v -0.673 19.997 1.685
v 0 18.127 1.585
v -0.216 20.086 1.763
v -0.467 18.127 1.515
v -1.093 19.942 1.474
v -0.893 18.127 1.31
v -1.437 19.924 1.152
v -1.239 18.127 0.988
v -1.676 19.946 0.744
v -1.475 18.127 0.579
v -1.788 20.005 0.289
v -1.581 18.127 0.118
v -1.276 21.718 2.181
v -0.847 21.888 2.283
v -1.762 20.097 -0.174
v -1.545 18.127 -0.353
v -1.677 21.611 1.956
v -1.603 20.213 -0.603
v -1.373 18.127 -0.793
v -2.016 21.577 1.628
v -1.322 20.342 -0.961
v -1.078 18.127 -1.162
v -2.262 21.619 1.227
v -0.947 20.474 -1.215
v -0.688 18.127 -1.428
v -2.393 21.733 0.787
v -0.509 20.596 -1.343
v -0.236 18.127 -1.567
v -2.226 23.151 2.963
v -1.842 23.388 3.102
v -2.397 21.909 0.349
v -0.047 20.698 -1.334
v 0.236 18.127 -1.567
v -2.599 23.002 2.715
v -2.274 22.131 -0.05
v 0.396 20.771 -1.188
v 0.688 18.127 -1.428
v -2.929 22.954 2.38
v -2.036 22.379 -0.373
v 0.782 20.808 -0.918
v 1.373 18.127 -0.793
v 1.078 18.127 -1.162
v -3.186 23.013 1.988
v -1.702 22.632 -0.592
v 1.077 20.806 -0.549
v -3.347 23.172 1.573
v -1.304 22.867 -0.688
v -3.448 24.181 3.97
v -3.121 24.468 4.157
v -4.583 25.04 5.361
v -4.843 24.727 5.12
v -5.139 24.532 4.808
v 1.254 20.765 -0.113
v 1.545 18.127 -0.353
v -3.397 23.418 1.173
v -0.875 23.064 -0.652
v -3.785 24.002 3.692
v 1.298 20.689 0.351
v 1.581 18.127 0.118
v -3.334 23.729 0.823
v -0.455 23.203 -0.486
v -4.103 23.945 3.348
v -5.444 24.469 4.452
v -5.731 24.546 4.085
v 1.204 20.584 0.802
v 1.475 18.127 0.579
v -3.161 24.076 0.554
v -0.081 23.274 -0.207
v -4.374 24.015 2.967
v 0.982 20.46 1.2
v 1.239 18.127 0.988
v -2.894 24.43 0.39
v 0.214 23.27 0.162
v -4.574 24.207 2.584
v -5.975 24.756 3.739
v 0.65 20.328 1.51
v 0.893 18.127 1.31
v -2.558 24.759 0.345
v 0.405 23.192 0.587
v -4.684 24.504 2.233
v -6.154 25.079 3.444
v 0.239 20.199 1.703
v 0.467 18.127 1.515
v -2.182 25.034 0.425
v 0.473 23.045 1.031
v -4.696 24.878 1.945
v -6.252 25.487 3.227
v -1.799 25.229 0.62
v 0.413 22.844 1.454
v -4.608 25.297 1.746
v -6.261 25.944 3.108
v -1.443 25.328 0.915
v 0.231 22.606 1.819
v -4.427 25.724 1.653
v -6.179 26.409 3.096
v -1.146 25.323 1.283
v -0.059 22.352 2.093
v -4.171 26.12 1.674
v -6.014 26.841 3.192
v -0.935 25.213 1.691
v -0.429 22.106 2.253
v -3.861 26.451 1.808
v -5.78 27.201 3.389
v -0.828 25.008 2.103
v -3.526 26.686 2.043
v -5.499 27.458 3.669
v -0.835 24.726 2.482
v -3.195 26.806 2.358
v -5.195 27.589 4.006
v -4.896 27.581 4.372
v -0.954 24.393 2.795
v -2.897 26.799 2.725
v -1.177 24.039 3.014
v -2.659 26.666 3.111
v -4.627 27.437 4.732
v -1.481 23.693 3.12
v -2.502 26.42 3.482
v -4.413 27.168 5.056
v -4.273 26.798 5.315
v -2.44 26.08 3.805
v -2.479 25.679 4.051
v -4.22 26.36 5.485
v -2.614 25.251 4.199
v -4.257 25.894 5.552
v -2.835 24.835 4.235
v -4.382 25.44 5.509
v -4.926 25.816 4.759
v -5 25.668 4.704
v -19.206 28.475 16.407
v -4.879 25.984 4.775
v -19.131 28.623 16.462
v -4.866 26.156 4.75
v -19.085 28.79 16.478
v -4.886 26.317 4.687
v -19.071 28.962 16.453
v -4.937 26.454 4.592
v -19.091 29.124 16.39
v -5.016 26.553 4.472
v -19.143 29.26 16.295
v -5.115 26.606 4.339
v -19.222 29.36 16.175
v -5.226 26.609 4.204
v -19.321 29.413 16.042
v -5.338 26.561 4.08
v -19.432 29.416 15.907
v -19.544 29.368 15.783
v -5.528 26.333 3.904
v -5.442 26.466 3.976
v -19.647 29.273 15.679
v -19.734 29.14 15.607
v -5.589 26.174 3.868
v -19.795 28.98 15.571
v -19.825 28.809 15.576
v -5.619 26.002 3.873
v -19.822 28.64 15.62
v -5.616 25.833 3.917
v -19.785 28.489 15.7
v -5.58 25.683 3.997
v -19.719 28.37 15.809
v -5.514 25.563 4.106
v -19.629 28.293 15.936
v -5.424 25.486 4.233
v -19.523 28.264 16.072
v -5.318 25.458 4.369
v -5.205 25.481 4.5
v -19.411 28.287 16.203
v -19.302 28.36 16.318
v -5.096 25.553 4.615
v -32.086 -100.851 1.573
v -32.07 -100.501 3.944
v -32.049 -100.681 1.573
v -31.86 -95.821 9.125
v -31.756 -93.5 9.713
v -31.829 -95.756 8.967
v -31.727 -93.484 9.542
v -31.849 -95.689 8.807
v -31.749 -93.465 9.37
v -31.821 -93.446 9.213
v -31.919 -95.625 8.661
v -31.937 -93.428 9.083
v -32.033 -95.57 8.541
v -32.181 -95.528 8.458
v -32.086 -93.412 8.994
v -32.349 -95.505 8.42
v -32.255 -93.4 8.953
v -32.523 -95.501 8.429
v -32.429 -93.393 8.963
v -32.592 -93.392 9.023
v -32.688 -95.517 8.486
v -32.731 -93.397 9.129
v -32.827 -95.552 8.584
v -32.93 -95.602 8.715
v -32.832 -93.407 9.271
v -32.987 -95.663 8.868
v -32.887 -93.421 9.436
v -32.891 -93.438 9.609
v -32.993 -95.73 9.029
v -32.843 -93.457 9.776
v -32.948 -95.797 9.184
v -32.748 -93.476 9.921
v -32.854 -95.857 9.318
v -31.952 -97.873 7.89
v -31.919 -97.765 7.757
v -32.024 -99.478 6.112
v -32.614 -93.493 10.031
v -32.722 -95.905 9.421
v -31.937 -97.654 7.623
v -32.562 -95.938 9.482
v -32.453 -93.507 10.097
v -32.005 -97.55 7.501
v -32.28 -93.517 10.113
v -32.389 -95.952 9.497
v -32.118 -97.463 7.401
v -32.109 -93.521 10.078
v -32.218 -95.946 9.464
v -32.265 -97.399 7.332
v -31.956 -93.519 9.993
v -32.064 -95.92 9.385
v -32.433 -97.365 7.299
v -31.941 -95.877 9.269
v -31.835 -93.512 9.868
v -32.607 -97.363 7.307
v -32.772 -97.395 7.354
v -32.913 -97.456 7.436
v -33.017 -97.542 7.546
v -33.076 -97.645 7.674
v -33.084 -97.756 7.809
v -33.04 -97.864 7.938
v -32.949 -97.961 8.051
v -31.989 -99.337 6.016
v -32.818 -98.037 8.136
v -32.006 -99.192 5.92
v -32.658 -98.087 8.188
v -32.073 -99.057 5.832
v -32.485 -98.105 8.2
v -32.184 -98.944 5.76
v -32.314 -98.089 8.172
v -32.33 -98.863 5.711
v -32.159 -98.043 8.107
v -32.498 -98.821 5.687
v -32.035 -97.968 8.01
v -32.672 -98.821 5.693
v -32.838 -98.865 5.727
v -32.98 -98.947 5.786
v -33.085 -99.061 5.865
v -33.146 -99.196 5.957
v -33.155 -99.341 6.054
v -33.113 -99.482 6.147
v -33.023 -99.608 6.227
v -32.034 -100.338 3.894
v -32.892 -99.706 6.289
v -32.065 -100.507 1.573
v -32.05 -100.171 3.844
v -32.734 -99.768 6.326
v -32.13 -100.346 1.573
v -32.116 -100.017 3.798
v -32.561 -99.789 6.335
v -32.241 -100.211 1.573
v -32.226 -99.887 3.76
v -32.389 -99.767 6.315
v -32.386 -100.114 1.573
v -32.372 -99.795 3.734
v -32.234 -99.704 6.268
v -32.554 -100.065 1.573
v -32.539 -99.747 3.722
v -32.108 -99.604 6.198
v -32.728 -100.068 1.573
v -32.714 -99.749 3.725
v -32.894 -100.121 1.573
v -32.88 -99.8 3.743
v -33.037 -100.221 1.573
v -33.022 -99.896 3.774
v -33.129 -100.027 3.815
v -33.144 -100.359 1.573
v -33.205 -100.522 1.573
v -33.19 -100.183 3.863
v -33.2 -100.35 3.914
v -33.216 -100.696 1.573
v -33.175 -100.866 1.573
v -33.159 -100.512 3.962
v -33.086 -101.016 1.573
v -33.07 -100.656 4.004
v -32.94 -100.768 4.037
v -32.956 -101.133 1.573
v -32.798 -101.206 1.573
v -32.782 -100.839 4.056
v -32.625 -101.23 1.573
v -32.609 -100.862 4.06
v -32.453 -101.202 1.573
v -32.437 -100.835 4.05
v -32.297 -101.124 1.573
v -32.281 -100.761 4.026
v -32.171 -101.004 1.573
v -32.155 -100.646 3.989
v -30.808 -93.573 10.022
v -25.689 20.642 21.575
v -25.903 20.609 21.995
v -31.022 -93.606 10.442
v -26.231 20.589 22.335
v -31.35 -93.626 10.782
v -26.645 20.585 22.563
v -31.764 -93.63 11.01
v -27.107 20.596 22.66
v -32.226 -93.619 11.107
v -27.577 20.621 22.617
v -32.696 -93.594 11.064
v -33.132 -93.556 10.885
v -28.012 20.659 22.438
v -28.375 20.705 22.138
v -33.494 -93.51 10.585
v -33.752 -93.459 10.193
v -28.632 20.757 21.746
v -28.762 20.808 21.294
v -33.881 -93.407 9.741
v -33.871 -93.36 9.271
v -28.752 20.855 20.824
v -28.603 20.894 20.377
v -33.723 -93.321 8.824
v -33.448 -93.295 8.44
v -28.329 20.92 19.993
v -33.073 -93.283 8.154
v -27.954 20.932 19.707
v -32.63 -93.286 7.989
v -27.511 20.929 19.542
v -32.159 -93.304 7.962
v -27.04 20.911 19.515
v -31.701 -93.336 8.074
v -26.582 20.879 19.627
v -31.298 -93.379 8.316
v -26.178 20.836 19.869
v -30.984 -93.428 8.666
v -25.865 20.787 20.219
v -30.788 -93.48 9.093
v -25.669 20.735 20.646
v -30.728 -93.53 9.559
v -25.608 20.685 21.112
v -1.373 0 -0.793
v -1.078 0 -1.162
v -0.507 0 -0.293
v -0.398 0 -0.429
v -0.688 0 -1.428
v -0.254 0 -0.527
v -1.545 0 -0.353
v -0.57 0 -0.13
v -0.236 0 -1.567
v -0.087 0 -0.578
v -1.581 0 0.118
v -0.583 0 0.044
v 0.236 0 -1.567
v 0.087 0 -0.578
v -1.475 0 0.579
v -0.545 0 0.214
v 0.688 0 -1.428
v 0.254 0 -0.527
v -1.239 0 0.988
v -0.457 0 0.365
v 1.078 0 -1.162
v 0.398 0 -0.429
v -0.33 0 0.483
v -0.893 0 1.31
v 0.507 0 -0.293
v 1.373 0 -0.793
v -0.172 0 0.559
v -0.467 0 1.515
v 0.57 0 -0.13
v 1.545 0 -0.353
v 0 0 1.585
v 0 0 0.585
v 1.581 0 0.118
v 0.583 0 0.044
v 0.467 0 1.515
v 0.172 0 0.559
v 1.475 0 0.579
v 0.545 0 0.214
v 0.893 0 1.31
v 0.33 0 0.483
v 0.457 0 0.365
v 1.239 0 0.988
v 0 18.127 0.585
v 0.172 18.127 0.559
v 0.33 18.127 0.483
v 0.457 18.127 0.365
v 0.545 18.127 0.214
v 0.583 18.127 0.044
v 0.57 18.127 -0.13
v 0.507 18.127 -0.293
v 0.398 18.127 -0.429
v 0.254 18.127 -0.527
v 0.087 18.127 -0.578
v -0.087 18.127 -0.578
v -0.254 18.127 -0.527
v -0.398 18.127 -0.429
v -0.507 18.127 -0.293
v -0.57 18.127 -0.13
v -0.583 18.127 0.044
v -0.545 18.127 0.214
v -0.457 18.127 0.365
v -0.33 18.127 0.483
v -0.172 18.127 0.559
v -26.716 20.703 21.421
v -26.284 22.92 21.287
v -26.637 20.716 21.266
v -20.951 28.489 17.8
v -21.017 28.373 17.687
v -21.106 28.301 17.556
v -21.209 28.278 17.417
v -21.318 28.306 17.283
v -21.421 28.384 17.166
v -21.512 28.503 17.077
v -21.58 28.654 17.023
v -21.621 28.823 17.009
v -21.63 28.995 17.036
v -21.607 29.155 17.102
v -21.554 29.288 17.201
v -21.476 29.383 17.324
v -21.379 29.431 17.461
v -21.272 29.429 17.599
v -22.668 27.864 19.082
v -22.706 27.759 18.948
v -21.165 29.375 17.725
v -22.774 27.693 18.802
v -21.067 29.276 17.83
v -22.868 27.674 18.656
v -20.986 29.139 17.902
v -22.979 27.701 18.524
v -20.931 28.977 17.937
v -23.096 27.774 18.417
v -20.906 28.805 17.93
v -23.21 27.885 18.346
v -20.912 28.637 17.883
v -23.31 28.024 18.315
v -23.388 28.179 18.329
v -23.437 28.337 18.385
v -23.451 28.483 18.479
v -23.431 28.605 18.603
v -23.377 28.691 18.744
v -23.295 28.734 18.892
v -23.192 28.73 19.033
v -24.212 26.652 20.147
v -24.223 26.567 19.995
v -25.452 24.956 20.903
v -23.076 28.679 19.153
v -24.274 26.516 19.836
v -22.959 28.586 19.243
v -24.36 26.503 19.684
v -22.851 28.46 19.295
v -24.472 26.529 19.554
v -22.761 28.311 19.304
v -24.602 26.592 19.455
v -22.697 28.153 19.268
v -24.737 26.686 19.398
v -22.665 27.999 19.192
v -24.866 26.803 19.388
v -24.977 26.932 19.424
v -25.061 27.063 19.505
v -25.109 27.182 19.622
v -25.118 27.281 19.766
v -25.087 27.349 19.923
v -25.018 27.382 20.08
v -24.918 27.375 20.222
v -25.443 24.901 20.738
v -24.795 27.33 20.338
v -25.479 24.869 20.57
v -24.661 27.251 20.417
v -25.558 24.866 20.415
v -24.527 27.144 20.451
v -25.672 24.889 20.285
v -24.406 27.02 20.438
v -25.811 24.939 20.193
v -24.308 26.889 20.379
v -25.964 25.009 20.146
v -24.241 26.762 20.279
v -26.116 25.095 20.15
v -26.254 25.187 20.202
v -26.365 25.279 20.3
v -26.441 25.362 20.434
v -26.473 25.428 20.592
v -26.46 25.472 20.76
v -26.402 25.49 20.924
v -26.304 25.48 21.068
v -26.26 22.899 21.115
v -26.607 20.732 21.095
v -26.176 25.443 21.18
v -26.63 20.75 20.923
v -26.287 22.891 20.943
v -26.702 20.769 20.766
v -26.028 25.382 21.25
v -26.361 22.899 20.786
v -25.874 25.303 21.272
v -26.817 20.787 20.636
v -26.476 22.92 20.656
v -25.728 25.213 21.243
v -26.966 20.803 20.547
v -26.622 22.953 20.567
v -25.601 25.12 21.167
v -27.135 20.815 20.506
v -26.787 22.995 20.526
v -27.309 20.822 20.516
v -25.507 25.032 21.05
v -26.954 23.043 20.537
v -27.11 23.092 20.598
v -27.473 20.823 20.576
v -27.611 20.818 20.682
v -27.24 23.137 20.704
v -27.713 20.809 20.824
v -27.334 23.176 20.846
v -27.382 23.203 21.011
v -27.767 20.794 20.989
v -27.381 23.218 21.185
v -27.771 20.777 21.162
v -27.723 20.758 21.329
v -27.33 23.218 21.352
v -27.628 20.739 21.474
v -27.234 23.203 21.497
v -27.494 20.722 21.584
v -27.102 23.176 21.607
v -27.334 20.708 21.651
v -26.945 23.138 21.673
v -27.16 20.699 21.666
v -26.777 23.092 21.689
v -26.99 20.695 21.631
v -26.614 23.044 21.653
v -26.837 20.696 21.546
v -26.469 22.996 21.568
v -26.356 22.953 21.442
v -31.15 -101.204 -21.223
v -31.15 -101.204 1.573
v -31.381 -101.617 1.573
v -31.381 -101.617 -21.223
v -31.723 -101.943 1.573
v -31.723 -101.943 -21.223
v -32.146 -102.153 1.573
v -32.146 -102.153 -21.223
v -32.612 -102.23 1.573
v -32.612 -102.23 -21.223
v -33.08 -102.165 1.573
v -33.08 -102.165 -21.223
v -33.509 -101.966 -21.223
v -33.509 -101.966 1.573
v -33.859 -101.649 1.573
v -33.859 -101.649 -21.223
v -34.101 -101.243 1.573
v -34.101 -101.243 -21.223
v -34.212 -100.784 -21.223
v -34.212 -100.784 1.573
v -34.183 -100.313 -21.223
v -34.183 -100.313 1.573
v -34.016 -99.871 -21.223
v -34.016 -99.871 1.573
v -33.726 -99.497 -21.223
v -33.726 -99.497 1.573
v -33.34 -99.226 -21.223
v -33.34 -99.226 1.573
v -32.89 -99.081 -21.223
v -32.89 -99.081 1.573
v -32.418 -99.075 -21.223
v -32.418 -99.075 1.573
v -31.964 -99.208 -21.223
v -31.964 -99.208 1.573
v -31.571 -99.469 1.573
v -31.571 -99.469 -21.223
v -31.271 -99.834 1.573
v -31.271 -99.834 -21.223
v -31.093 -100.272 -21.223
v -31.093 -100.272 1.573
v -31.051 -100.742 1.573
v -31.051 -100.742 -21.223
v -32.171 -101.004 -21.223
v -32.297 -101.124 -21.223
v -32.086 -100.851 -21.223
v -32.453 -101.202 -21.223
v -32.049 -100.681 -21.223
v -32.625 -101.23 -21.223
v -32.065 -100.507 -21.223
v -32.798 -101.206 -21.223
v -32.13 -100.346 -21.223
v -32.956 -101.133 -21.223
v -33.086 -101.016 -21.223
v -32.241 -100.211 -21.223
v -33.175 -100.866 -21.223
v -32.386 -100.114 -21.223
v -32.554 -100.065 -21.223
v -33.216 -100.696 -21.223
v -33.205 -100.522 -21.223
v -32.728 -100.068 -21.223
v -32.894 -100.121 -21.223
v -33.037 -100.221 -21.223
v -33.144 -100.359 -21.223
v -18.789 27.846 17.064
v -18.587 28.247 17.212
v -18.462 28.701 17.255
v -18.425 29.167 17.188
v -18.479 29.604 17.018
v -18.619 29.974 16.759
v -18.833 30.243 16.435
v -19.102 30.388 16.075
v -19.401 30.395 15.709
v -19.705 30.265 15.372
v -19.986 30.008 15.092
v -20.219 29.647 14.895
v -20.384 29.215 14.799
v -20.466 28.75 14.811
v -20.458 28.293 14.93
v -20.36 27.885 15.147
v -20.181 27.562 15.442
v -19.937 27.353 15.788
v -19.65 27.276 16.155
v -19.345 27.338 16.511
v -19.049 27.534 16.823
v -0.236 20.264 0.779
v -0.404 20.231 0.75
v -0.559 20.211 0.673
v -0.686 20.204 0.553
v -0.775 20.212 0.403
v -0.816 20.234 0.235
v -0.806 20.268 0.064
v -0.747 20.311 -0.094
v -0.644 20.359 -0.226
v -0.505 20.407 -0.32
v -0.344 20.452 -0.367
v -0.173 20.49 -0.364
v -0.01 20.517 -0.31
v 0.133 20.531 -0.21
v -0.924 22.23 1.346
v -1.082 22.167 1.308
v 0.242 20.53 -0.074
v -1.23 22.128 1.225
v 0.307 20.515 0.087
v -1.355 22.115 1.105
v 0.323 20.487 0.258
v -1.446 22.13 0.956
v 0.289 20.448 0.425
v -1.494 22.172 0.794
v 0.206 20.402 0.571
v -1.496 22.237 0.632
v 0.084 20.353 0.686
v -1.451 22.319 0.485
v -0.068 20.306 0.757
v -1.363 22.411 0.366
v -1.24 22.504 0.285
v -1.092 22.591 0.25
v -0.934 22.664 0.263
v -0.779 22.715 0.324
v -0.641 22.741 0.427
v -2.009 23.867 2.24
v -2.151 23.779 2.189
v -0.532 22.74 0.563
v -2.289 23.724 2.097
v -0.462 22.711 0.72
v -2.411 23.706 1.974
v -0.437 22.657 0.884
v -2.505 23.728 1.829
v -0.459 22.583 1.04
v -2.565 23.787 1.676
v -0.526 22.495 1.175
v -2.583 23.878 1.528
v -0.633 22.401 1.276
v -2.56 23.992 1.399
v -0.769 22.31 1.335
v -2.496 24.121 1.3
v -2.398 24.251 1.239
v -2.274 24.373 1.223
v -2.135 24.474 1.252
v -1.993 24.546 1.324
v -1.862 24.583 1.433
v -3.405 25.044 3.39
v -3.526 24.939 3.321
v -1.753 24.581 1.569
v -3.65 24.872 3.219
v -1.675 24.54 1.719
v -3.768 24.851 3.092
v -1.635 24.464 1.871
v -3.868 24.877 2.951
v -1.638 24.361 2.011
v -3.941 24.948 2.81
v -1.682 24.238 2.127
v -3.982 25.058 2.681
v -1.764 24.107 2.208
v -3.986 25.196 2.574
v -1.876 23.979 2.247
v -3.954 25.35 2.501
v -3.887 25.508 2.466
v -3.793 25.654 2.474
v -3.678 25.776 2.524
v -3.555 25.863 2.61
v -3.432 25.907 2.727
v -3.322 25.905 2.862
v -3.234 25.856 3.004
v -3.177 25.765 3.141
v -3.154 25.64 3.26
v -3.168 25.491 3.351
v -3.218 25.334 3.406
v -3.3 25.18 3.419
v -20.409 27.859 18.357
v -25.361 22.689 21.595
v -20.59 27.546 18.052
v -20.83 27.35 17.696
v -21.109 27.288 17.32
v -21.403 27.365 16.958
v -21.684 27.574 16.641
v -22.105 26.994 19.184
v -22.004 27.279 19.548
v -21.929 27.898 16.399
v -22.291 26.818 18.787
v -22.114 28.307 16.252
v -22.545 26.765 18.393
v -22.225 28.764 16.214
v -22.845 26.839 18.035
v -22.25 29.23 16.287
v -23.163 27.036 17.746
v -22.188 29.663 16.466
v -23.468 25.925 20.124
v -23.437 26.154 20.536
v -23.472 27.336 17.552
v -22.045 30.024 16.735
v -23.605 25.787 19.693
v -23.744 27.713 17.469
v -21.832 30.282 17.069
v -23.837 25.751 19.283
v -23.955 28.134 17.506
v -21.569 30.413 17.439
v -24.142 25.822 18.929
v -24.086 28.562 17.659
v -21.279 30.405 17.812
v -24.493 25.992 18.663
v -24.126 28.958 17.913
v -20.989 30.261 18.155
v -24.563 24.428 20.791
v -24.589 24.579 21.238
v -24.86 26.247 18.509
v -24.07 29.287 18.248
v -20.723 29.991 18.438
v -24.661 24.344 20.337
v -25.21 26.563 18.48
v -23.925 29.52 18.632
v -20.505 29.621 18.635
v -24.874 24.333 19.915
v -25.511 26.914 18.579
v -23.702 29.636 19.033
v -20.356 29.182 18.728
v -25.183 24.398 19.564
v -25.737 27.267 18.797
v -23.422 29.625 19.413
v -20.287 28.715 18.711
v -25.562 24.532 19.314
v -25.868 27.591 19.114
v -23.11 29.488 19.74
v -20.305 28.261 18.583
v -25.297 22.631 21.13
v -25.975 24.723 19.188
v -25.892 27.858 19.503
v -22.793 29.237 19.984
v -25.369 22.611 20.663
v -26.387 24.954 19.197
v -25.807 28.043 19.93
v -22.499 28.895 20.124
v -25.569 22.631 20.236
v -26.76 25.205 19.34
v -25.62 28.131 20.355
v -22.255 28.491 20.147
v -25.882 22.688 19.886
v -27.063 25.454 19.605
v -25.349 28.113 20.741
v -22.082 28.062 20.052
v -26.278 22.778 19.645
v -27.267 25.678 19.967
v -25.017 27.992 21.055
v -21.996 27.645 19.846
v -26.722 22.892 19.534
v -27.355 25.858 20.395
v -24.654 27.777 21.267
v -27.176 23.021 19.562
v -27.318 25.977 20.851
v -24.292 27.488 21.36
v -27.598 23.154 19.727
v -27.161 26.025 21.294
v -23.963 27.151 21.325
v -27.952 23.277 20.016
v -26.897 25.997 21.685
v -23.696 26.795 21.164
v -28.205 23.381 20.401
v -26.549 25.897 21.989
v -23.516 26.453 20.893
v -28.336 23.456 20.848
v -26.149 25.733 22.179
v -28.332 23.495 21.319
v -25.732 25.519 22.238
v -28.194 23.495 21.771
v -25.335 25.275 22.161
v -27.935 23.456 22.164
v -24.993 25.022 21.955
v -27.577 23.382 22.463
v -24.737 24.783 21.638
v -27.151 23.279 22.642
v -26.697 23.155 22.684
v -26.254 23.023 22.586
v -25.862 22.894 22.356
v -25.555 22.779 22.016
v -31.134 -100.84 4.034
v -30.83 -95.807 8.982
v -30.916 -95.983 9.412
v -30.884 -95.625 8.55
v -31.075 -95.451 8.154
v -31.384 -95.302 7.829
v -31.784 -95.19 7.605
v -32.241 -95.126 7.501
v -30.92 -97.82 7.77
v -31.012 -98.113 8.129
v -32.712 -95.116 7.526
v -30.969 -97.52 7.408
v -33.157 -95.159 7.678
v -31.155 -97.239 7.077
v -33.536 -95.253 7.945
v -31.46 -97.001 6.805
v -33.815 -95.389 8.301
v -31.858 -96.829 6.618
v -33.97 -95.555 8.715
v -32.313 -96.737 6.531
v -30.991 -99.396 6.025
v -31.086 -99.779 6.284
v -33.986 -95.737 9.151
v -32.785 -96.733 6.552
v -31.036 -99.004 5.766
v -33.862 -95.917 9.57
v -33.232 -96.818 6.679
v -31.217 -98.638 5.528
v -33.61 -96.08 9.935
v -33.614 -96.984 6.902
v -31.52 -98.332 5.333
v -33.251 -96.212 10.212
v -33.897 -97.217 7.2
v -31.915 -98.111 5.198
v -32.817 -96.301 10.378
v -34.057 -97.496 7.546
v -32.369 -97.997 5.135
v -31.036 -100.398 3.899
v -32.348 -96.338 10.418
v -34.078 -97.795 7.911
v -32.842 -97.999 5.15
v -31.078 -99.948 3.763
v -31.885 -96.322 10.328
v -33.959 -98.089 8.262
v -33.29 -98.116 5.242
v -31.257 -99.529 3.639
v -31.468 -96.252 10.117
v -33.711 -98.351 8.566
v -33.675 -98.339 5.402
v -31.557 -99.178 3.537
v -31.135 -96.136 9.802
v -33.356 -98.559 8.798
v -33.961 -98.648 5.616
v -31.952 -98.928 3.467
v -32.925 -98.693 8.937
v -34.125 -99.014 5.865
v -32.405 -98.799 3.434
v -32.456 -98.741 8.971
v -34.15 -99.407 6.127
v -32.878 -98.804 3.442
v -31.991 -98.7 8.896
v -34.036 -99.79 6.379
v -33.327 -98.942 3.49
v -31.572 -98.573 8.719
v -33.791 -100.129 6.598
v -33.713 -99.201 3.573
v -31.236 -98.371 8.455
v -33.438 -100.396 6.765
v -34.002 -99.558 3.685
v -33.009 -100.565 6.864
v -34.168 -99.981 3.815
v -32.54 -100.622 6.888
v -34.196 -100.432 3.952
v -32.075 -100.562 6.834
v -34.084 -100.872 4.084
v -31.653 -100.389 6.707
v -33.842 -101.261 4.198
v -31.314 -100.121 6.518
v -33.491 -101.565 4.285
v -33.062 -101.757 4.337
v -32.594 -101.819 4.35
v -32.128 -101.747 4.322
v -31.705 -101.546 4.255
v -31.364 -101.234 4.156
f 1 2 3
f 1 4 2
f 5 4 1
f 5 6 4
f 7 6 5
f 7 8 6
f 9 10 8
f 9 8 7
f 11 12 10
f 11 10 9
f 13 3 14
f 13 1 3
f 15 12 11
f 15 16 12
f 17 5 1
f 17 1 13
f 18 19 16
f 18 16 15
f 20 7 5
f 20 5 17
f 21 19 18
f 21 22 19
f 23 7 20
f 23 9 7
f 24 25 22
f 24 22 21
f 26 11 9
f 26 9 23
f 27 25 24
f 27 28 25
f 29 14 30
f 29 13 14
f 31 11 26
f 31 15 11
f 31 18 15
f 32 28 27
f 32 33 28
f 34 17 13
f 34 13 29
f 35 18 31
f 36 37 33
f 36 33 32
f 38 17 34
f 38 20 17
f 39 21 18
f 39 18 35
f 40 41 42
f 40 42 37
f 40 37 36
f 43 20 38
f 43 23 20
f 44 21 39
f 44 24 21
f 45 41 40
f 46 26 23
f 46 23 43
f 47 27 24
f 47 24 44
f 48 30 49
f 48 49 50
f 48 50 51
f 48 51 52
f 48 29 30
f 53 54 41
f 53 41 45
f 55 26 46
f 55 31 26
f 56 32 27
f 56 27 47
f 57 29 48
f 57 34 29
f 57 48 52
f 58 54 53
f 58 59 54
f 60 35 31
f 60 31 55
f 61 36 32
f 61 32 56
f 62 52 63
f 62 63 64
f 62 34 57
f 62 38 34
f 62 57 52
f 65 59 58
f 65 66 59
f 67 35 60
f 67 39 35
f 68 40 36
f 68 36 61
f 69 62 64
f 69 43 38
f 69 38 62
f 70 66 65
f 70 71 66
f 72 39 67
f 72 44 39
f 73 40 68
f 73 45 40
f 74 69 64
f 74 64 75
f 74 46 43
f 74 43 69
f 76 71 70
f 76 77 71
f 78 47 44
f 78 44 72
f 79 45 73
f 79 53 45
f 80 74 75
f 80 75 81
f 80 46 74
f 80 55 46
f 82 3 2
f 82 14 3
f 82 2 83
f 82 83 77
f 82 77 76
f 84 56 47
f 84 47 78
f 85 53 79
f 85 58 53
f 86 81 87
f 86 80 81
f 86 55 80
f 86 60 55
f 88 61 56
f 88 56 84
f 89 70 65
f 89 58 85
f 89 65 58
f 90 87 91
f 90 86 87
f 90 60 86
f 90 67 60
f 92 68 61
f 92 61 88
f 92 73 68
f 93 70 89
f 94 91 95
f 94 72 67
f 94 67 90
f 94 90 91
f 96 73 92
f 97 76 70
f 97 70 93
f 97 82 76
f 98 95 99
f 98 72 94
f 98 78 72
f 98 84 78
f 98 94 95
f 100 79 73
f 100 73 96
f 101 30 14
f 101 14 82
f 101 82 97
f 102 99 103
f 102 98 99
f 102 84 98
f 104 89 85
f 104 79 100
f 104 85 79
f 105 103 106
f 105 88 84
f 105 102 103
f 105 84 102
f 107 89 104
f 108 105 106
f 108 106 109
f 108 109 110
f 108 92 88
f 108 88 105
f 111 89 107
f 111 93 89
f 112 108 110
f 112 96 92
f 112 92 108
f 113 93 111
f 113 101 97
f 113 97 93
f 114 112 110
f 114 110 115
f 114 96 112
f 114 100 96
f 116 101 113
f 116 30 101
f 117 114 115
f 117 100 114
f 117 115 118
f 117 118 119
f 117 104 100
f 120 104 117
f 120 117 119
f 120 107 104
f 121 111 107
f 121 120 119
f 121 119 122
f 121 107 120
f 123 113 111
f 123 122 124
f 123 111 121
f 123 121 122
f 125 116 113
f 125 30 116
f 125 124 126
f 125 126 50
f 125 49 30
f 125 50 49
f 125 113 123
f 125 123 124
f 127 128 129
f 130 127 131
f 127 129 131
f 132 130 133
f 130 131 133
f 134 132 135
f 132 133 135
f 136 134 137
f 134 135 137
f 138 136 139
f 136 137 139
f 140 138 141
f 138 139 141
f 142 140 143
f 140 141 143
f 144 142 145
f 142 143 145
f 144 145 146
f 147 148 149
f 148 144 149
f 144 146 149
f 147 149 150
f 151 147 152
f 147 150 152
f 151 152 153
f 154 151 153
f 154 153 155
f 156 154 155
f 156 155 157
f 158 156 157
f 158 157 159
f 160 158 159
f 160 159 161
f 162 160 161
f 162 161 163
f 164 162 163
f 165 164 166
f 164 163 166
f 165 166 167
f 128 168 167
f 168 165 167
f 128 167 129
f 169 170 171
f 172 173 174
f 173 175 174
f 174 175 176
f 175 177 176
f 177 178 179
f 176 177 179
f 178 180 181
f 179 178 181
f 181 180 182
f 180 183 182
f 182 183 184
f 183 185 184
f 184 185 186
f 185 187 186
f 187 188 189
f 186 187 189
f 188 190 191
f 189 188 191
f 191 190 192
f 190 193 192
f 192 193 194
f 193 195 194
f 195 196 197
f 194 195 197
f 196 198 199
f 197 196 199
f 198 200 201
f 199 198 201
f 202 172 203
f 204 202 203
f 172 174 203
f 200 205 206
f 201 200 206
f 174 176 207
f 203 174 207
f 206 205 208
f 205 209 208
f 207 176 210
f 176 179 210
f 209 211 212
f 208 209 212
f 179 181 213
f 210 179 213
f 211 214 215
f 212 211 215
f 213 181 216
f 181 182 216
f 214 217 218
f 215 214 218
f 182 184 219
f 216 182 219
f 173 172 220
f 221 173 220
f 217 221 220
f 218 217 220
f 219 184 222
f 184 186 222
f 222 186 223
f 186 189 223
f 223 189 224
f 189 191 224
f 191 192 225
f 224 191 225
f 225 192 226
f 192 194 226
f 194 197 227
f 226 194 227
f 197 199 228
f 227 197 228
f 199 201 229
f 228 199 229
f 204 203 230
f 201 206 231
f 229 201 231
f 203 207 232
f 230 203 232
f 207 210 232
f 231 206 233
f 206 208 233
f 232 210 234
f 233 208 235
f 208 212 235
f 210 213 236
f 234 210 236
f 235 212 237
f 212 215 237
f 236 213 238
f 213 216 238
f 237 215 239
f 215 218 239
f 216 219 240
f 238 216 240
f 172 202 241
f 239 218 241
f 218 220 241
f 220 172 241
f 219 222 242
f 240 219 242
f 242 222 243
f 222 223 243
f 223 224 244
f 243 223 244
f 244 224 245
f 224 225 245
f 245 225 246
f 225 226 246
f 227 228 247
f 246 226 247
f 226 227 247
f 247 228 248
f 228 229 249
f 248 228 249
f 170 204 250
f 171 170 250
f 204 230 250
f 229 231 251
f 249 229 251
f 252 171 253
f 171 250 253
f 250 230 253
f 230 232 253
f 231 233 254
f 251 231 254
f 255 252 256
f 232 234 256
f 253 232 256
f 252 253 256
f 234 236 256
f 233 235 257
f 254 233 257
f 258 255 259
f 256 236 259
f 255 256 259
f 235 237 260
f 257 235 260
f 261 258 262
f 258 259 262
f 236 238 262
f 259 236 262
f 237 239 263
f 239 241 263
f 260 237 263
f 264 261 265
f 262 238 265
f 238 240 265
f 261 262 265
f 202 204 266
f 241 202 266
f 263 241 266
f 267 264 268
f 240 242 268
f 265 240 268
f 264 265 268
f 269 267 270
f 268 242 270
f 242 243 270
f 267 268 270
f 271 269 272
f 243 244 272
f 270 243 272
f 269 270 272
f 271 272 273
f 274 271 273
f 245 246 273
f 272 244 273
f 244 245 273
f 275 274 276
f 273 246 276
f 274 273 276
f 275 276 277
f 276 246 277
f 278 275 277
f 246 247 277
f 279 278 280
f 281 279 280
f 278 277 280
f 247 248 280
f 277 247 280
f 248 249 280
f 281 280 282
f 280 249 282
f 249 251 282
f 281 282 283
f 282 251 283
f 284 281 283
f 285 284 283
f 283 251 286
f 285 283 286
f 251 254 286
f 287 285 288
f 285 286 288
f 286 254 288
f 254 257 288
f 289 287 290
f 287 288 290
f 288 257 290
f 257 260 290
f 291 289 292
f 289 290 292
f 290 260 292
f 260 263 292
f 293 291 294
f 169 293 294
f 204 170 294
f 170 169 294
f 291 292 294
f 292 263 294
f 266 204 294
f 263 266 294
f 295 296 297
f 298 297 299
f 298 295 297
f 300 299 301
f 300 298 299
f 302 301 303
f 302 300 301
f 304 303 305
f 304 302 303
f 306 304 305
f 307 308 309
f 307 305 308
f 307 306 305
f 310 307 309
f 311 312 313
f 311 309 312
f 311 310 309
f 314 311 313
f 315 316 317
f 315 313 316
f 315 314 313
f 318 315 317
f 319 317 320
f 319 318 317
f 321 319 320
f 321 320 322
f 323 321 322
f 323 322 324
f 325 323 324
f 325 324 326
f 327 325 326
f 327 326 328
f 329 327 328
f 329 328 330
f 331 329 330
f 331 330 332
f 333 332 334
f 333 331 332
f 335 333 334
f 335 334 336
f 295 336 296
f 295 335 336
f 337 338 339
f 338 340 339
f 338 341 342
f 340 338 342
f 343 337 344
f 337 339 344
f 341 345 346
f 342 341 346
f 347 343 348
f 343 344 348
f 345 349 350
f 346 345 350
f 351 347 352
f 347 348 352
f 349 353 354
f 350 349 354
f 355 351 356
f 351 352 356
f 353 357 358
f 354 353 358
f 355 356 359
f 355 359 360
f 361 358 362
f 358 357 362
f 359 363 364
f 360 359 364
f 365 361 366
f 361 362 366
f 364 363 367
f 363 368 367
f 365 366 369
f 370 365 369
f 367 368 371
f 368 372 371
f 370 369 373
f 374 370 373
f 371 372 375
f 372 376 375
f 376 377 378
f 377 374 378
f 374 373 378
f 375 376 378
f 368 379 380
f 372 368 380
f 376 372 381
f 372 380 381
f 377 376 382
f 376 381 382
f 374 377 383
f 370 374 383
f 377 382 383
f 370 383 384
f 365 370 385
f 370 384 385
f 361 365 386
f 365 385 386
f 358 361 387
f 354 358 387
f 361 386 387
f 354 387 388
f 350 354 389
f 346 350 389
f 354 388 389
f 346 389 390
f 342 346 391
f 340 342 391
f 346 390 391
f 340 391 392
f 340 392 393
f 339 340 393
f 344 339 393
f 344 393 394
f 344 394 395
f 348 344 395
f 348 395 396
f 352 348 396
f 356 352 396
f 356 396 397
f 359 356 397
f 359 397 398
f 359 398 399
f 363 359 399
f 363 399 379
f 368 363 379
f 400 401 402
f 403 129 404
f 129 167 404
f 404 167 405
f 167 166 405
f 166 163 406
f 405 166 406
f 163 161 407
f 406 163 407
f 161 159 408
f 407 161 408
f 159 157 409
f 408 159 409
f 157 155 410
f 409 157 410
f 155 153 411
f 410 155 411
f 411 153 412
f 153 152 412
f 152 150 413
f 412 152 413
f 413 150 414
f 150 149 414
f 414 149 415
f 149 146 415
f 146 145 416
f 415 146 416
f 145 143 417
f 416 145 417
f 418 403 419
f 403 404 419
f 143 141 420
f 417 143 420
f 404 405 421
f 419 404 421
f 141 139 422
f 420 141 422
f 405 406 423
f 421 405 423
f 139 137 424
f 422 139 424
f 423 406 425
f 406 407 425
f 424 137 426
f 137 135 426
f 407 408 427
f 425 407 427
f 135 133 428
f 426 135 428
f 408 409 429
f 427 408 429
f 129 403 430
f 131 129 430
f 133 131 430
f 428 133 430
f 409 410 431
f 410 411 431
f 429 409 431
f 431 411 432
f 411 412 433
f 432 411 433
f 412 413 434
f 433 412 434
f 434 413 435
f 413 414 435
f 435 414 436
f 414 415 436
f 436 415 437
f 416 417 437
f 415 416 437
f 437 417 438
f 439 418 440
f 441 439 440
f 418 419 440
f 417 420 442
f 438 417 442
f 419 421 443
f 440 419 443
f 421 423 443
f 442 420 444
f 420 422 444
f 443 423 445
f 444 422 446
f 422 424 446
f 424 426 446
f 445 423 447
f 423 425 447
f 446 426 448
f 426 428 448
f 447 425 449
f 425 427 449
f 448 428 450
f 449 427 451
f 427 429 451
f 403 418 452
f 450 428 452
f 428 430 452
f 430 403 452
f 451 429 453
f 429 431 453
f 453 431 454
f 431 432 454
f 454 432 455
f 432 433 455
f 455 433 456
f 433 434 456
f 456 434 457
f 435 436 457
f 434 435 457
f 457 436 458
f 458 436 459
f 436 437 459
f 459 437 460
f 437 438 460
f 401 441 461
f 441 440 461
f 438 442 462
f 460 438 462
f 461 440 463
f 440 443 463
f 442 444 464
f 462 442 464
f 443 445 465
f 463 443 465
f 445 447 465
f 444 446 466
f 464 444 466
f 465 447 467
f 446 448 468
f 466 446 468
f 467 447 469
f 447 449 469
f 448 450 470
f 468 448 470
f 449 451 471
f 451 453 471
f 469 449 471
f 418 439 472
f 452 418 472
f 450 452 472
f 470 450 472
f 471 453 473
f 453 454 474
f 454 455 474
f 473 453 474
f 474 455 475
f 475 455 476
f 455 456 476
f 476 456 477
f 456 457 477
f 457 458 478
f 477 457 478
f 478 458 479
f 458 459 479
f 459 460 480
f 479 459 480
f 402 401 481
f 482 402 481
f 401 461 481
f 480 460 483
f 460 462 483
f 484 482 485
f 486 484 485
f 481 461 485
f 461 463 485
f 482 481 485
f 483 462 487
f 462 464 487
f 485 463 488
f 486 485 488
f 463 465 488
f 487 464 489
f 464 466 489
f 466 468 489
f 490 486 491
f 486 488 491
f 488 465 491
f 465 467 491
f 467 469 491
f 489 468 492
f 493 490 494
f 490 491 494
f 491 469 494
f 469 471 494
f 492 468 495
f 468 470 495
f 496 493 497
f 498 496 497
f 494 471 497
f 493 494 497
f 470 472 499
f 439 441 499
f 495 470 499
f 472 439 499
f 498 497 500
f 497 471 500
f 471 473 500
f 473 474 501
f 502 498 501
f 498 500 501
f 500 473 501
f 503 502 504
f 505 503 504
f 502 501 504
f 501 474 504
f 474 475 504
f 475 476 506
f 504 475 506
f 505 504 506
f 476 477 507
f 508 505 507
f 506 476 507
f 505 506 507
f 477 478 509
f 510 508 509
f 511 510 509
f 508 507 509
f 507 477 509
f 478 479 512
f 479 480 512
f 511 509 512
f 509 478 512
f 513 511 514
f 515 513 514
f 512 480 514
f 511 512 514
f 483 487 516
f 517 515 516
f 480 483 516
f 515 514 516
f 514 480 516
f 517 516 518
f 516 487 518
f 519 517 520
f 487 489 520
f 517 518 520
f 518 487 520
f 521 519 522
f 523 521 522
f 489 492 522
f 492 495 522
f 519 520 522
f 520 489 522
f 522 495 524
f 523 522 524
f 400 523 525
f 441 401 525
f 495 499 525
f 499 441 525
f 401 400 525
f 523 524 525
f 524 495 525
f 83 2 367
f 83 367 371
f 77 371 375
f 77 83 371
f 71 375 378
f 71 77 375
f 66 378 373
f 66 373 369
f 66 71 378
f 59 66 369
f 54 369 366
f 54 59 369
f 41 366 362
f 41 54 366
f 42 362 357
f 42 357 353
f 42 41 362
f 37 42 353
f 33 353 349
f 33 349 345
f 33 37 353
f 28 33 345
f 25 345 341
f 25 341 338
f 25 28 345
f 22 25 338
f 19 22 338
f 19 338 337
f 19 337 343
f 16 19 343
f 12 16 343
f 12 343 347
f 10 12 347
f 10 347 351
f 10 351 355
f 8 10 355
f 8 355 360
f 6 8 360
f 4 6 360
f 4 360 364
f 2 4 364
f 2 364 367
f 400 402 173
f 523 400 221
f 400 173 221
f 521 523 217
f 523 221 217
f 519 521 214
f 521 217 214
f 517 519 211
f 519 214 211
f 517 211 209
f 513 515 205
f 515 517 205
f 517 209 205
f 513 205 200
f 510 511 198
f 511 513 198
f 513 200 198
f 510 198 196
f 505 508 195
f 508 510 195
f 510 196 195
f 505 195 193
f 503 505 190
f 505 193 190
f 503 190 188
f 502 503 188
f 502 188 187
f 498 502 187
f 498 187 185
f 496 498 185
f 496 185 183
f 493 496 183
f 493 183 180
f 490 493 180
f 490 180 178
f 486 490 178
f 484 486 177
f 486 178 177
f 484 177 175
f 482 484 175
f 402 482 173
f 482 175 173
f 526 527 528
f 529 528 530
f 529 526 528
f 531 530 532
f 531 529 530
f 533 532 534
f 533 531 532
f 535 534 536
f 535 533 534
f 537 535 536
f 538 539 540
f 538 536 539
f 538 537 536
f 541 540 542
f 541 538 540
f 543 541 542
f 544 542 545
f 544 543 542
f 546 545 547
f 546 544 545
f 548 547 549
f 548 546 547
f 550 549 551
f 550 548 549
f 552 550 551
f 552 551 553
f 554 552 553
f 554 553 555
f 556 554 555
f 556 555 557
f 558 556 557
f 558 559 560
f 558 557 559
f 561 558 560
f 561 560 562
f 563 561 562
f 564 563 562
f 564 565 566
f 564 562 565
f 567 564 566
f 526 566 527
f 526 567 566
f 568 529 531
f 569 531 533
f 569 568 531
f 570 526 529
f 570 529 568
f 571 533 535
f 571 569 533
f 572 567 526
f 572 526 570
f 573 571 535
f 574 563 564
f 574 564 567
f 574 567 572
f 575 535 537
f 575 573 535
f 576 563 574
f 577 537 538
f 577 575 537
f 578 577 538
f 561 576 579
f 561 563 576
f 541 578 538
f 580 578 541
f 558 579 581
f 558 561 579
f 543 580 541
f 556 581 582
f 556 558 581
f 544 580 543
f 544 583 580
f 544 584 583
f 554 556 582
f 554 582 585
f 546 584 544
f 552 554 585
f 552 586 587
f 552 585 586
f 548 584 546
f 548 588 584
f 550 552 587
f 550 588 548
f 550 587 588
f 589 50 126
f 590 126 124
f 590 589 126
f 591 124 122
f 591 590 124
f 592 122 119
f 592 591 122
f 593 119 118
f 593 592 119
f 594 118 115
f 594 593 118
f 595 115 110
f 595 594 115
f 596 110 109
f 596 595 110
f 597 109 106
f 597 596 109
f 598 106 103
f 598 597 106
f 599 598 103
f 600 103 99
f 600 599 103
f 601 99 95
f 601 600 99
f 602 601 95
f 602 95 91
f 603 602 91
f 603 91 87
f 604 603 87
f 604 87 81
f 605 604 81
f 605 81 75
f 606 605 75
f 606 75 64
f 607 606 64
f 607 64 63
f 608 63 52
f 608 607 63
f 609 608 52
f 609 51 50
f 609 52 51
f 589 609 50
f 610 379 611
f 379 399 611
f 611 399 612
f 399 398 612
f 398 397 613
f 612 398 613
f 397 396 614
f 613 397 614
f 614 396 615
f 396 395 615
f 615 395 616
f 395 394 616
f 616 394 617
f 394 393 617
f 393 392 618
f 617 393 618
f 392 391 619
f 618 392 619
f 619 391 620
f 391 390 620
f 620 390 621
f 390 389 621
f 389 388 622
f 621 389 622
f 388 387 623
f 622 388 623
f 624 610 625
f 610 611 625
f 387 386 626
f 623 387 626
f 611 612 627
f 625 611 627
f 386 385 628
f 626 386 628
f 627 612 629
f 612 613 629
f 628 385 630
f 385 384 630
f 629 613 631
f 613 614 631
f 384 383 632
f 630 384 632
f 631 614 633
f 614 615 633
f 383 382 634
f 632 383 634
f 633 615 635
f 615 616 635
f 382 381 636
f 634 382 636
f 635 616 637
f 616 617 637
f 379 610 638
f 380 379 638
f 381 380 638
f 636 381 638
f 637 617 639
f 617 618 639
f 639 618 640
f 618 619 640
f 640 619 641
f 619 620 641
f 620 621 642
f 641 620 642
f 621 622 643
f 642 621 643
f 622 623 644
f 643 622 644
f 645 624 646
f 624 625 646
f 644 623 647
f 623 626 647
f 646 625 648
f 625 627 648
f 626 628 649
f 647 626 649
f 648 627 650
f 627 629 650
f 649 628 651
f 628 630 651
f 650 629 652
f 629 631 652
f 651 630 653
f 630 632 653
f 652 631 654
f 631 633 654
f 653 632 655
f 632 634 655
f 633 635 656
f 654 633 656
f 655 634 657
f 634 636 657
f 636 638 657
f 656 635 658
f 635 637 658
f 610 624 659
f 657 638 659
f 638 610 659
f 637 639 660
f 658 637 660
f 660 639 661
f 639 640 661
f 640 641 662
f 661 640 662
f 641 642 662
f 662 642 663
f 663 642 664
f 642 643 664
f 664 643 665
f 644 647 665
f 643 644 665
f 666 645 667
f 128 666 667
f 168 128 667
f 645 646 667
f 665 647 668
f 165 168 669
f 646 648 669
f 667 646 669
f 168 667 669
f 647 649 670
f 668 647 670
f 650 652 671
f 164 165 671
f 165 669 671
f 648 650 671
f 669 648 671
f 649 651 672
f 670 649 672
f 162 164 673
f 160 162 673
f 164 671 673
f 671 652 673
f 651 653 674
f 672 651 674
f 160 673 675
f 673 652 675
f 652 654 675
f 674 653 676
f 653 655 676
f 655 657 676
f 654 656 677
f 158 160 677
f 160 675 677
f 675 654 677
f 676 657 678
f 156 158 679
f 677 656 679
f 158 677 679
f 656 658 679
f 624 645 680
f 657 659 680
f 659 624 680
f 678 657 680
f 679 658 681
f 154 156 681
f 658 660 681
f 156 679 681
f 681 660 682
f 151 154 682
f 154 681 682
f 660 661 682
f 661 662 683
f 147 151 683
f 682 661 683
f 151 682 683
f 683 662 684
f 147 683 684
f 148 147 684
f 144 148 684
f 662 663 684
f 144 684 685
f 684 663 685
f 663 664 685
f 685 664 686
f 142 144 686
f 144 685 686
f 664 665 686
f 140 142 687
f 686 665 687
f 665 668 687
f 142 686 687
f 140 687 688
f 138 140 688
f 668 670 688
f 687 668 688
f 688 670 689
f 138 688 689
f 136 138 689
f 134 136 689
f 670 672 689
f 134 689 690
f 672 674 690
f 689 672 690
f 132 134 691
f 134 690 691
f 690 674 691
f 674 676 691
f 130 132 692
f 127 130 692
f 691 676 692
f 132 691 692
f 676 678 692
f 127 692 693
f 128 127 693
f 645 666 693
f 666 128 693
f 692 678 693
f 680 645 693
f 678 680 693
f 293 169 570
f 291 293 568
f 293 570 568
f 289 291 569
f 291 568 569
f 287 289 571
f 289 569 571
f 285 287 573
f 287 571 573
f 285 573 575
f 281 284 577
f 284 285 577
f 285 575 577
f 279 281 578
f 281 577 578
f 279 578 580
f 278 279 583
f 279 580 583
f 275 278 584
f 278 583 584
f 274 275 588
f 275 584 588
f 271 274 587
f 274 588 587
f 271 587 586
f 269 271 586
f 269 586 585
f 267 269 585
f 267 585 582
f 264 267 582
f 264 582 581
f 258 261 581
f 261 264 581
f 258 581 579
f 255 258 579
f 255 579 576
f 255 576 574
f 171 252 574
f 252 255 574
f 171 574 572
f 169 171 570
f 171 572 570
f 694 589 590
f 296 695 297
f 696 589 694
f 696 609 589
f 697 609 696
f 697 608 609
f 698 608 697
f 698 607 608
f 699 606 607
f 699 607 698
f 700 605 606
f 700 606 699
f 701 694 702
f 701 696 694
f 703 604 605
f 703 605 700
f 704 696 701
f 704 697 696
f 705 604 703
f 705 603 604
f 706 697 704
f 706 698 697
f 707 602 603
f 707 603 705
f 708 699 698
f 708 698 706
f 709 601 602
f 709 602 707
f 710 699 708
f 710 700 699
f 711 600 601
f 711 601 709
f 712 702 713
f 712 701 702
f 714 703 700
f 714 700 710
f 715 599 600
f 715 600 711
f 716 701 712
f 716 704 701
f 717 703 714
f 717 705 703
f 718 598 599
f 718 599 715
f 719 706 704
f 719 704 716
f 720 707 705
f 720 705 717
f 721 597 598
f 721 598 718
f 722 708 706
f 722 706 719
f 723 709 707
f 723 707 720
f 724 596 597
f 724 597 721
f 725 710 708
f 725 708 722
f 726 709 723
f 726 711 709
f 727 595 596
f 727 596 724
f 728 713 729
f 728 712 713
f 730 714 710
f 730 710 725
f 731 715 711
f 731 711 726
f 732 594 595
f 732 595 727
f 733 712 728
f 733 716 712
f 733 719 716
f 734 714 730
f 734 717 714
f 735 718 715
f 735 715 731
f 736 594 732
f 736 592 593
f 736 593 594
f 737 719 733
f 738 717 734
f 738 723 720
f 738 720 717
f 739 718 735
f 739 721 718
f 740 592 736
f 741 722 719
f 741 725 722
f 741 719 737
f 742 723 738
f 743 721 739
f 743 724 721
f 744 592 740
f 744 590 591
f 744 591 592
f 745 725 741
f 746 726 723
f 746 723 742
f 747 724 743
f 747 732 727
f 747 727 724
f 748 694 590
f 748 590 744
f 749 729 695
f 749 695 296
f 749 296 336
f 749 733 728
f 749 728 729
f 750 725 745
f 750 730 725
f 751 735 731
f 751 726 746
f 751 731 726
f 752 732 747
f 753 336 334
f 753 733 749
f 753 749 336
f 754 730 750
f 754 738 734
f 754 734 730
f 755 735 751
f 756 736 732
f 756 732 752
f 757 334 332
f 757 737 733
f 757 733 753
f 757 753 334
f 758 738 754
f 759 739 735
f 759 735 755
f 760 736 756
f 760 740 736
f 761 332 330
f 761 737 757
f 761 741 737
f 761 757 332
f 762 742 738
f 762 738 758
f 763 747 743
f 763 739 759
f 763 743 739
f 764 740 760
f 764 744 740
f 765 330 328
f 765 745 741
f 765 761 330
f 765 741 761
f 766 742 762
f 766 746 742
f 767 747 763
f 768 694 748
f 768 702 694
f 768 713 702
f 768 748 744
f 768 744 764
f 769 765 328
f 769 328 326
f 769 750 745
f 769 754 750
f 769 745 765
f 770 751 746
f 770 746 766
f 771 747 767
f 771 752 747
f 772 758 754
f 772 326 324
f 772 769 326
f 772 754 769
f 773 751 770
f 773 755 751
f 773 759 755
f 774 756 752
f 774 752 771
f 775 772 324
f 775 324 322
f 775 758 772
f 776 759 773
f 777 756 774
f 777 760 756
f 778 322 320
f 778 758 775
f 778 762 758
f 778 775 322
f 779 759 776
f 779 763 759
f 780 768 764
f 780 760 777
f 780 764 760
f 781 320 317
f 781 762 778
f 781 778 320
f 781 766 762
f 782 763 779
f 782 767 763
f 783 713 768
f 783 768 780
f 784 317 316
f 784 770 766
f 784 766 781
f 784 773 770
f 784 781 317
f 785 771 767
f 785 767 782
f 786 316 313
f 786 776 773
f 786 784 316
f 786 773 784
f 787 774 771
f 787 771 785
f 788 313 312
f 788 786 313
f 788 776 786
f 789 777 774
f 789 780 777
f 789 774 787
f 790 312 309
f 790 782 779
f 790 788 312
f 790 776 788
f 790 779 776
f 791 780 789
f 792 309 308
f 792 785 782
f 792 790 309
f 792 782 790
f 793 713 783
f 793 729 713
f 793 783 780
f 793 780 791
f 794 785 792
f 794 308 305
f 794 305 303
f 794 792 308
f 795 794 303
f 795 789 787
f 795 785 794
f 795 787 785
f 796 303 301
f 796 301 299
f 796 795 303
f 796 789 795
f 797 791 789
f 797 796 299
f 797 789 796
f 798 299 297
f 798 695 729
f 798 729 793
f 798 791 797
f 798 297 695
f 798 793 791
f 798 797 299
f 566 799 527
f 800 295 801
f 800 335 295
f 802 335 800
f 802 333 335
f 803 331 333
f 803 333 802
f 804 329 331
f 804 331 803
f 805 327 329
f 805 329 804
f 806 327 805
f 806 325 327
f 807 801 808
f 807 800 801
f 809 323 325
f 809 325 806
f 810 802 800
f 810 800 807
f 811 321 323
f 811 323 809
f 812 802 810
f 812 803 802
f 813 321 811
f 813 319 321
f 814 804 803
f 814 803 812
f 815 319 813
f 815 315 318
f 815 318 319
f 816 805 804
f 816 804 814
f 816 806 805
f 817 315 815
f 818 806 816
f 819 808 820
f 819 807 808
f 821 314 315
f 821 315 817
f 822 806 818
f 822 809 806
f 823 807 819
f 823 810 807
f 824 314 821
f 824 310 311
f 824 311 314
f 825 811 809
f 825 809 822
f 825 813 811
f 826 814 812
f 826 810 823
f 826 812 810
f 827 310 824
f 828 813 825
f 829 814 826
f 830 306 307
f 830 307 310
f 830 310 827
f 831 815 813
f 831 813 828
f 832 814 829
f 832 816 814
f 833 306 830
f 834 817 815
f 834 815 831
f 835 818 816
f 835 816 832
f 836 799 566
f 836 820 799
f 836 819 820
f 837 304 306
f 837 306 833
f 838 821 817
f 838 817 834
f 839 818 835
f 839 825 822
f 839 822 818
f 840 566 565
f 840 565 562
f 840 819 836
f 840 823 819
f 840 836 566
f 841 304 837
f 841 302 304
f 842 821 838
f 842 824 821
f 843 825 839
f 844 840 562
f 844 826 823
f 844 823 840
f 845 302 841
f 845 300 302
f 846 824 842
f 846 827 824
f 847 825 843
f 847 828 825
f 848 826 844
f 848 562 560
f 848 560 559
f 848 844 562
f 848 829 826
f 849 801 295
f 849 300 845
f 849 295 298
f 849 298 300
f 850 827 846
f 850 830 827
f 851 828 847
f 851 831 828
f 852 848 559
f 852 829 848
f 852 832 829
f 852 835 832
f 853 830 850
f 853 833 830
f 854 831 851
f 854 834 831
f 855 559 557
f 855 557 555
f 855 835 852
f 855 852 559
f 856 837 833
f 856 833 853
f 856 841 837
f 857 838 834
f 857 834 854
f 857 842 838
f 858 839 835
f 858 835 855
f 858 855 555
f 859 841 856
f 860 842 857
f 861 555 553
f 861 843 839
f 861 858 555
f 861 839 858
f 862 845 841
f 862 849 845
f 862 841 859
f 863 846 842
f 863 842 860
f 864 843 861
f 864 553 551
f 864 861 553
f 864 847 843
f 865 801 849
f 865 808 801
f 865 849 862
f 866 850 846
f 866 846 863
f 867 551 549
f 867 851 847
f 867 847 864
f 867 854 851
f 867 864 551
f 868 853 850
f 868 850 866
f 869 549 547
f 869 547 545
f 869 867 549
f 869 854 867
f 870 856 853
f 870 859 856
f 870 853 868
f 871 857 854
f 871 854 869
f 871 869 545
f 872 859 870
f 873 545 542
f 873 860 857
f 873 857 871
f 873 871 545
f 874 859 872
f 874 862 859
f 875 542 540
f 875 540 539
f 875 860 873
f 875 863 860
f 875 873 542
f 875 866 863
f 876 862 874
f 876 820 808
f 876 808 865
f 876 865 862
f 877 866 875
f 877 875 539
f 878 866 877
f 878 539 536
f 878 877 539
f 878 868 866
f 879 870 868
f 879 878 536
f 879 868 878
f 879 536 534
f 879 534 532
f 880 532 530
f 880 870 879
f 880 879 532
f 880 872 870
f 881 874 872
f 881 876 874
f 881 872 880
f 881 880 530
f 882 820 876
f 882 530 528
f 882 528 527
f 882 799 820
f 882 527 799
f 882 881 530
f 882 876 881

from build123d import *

# Parameters (mm, degrees)
SWEEP_SOTTILE2_PROFILE_R   = 1.585
SWEEP_SOTTILE2_PROFILE_R_2 = 0.585


with BuildPart() as part:
    # Sweep-Sottile2: sweep along a curve in space
    with BuildLine() as sweep_sottile2_path:
        Line((0, 0, 0), (0, 18.127410745, 0))
        ThreePointArc((0, 18.127410745, 0), (-1.490951839, 23.340492786, 1.228284678), (-5.243774412, 26.035994644, 4.319956954))
        Line((-5.243774412, 26.035994644, 4.319956954), (-19.449428273, 28.842557275, 16.022941934))
        ThreePointArc((-19.449428273, 28.842557275, 16.022941934), (-24.665337869, 26.943364665, 19.918970251), (-27.191531065, 20.758738002, 21.08534203))
        Line((-27.191531065, 20.758738002, 21.08534203), (-32.310949634, -93.456386342, 9.532293275))
        ThreePointArc((-32.310949634, -93.456386342, 9.532293275), (-32.540663603, -98.581345189, 6.937785997), (-32.633155846, -100.64486334, 1.57282768))
        Line((-32.633155846, -100.64486334, 1.57282768), (-32.633155846, -100.64486334, -21.222828084))
    # Sweep-Sottile2 profile (on start of the path) → Sweep-Sottile2 (sweep)
    with BuildSketch(Plane.ZX):
        Circle(SWEEP_SOTTILE2_PROFILE_R)
        Circle(SWEEP_SOTTILE2_PROFILE_R_2, mode=Mode.SUBTRACT)
    sweep(path=sweep_sottile2_path.line)


solid = part.part
